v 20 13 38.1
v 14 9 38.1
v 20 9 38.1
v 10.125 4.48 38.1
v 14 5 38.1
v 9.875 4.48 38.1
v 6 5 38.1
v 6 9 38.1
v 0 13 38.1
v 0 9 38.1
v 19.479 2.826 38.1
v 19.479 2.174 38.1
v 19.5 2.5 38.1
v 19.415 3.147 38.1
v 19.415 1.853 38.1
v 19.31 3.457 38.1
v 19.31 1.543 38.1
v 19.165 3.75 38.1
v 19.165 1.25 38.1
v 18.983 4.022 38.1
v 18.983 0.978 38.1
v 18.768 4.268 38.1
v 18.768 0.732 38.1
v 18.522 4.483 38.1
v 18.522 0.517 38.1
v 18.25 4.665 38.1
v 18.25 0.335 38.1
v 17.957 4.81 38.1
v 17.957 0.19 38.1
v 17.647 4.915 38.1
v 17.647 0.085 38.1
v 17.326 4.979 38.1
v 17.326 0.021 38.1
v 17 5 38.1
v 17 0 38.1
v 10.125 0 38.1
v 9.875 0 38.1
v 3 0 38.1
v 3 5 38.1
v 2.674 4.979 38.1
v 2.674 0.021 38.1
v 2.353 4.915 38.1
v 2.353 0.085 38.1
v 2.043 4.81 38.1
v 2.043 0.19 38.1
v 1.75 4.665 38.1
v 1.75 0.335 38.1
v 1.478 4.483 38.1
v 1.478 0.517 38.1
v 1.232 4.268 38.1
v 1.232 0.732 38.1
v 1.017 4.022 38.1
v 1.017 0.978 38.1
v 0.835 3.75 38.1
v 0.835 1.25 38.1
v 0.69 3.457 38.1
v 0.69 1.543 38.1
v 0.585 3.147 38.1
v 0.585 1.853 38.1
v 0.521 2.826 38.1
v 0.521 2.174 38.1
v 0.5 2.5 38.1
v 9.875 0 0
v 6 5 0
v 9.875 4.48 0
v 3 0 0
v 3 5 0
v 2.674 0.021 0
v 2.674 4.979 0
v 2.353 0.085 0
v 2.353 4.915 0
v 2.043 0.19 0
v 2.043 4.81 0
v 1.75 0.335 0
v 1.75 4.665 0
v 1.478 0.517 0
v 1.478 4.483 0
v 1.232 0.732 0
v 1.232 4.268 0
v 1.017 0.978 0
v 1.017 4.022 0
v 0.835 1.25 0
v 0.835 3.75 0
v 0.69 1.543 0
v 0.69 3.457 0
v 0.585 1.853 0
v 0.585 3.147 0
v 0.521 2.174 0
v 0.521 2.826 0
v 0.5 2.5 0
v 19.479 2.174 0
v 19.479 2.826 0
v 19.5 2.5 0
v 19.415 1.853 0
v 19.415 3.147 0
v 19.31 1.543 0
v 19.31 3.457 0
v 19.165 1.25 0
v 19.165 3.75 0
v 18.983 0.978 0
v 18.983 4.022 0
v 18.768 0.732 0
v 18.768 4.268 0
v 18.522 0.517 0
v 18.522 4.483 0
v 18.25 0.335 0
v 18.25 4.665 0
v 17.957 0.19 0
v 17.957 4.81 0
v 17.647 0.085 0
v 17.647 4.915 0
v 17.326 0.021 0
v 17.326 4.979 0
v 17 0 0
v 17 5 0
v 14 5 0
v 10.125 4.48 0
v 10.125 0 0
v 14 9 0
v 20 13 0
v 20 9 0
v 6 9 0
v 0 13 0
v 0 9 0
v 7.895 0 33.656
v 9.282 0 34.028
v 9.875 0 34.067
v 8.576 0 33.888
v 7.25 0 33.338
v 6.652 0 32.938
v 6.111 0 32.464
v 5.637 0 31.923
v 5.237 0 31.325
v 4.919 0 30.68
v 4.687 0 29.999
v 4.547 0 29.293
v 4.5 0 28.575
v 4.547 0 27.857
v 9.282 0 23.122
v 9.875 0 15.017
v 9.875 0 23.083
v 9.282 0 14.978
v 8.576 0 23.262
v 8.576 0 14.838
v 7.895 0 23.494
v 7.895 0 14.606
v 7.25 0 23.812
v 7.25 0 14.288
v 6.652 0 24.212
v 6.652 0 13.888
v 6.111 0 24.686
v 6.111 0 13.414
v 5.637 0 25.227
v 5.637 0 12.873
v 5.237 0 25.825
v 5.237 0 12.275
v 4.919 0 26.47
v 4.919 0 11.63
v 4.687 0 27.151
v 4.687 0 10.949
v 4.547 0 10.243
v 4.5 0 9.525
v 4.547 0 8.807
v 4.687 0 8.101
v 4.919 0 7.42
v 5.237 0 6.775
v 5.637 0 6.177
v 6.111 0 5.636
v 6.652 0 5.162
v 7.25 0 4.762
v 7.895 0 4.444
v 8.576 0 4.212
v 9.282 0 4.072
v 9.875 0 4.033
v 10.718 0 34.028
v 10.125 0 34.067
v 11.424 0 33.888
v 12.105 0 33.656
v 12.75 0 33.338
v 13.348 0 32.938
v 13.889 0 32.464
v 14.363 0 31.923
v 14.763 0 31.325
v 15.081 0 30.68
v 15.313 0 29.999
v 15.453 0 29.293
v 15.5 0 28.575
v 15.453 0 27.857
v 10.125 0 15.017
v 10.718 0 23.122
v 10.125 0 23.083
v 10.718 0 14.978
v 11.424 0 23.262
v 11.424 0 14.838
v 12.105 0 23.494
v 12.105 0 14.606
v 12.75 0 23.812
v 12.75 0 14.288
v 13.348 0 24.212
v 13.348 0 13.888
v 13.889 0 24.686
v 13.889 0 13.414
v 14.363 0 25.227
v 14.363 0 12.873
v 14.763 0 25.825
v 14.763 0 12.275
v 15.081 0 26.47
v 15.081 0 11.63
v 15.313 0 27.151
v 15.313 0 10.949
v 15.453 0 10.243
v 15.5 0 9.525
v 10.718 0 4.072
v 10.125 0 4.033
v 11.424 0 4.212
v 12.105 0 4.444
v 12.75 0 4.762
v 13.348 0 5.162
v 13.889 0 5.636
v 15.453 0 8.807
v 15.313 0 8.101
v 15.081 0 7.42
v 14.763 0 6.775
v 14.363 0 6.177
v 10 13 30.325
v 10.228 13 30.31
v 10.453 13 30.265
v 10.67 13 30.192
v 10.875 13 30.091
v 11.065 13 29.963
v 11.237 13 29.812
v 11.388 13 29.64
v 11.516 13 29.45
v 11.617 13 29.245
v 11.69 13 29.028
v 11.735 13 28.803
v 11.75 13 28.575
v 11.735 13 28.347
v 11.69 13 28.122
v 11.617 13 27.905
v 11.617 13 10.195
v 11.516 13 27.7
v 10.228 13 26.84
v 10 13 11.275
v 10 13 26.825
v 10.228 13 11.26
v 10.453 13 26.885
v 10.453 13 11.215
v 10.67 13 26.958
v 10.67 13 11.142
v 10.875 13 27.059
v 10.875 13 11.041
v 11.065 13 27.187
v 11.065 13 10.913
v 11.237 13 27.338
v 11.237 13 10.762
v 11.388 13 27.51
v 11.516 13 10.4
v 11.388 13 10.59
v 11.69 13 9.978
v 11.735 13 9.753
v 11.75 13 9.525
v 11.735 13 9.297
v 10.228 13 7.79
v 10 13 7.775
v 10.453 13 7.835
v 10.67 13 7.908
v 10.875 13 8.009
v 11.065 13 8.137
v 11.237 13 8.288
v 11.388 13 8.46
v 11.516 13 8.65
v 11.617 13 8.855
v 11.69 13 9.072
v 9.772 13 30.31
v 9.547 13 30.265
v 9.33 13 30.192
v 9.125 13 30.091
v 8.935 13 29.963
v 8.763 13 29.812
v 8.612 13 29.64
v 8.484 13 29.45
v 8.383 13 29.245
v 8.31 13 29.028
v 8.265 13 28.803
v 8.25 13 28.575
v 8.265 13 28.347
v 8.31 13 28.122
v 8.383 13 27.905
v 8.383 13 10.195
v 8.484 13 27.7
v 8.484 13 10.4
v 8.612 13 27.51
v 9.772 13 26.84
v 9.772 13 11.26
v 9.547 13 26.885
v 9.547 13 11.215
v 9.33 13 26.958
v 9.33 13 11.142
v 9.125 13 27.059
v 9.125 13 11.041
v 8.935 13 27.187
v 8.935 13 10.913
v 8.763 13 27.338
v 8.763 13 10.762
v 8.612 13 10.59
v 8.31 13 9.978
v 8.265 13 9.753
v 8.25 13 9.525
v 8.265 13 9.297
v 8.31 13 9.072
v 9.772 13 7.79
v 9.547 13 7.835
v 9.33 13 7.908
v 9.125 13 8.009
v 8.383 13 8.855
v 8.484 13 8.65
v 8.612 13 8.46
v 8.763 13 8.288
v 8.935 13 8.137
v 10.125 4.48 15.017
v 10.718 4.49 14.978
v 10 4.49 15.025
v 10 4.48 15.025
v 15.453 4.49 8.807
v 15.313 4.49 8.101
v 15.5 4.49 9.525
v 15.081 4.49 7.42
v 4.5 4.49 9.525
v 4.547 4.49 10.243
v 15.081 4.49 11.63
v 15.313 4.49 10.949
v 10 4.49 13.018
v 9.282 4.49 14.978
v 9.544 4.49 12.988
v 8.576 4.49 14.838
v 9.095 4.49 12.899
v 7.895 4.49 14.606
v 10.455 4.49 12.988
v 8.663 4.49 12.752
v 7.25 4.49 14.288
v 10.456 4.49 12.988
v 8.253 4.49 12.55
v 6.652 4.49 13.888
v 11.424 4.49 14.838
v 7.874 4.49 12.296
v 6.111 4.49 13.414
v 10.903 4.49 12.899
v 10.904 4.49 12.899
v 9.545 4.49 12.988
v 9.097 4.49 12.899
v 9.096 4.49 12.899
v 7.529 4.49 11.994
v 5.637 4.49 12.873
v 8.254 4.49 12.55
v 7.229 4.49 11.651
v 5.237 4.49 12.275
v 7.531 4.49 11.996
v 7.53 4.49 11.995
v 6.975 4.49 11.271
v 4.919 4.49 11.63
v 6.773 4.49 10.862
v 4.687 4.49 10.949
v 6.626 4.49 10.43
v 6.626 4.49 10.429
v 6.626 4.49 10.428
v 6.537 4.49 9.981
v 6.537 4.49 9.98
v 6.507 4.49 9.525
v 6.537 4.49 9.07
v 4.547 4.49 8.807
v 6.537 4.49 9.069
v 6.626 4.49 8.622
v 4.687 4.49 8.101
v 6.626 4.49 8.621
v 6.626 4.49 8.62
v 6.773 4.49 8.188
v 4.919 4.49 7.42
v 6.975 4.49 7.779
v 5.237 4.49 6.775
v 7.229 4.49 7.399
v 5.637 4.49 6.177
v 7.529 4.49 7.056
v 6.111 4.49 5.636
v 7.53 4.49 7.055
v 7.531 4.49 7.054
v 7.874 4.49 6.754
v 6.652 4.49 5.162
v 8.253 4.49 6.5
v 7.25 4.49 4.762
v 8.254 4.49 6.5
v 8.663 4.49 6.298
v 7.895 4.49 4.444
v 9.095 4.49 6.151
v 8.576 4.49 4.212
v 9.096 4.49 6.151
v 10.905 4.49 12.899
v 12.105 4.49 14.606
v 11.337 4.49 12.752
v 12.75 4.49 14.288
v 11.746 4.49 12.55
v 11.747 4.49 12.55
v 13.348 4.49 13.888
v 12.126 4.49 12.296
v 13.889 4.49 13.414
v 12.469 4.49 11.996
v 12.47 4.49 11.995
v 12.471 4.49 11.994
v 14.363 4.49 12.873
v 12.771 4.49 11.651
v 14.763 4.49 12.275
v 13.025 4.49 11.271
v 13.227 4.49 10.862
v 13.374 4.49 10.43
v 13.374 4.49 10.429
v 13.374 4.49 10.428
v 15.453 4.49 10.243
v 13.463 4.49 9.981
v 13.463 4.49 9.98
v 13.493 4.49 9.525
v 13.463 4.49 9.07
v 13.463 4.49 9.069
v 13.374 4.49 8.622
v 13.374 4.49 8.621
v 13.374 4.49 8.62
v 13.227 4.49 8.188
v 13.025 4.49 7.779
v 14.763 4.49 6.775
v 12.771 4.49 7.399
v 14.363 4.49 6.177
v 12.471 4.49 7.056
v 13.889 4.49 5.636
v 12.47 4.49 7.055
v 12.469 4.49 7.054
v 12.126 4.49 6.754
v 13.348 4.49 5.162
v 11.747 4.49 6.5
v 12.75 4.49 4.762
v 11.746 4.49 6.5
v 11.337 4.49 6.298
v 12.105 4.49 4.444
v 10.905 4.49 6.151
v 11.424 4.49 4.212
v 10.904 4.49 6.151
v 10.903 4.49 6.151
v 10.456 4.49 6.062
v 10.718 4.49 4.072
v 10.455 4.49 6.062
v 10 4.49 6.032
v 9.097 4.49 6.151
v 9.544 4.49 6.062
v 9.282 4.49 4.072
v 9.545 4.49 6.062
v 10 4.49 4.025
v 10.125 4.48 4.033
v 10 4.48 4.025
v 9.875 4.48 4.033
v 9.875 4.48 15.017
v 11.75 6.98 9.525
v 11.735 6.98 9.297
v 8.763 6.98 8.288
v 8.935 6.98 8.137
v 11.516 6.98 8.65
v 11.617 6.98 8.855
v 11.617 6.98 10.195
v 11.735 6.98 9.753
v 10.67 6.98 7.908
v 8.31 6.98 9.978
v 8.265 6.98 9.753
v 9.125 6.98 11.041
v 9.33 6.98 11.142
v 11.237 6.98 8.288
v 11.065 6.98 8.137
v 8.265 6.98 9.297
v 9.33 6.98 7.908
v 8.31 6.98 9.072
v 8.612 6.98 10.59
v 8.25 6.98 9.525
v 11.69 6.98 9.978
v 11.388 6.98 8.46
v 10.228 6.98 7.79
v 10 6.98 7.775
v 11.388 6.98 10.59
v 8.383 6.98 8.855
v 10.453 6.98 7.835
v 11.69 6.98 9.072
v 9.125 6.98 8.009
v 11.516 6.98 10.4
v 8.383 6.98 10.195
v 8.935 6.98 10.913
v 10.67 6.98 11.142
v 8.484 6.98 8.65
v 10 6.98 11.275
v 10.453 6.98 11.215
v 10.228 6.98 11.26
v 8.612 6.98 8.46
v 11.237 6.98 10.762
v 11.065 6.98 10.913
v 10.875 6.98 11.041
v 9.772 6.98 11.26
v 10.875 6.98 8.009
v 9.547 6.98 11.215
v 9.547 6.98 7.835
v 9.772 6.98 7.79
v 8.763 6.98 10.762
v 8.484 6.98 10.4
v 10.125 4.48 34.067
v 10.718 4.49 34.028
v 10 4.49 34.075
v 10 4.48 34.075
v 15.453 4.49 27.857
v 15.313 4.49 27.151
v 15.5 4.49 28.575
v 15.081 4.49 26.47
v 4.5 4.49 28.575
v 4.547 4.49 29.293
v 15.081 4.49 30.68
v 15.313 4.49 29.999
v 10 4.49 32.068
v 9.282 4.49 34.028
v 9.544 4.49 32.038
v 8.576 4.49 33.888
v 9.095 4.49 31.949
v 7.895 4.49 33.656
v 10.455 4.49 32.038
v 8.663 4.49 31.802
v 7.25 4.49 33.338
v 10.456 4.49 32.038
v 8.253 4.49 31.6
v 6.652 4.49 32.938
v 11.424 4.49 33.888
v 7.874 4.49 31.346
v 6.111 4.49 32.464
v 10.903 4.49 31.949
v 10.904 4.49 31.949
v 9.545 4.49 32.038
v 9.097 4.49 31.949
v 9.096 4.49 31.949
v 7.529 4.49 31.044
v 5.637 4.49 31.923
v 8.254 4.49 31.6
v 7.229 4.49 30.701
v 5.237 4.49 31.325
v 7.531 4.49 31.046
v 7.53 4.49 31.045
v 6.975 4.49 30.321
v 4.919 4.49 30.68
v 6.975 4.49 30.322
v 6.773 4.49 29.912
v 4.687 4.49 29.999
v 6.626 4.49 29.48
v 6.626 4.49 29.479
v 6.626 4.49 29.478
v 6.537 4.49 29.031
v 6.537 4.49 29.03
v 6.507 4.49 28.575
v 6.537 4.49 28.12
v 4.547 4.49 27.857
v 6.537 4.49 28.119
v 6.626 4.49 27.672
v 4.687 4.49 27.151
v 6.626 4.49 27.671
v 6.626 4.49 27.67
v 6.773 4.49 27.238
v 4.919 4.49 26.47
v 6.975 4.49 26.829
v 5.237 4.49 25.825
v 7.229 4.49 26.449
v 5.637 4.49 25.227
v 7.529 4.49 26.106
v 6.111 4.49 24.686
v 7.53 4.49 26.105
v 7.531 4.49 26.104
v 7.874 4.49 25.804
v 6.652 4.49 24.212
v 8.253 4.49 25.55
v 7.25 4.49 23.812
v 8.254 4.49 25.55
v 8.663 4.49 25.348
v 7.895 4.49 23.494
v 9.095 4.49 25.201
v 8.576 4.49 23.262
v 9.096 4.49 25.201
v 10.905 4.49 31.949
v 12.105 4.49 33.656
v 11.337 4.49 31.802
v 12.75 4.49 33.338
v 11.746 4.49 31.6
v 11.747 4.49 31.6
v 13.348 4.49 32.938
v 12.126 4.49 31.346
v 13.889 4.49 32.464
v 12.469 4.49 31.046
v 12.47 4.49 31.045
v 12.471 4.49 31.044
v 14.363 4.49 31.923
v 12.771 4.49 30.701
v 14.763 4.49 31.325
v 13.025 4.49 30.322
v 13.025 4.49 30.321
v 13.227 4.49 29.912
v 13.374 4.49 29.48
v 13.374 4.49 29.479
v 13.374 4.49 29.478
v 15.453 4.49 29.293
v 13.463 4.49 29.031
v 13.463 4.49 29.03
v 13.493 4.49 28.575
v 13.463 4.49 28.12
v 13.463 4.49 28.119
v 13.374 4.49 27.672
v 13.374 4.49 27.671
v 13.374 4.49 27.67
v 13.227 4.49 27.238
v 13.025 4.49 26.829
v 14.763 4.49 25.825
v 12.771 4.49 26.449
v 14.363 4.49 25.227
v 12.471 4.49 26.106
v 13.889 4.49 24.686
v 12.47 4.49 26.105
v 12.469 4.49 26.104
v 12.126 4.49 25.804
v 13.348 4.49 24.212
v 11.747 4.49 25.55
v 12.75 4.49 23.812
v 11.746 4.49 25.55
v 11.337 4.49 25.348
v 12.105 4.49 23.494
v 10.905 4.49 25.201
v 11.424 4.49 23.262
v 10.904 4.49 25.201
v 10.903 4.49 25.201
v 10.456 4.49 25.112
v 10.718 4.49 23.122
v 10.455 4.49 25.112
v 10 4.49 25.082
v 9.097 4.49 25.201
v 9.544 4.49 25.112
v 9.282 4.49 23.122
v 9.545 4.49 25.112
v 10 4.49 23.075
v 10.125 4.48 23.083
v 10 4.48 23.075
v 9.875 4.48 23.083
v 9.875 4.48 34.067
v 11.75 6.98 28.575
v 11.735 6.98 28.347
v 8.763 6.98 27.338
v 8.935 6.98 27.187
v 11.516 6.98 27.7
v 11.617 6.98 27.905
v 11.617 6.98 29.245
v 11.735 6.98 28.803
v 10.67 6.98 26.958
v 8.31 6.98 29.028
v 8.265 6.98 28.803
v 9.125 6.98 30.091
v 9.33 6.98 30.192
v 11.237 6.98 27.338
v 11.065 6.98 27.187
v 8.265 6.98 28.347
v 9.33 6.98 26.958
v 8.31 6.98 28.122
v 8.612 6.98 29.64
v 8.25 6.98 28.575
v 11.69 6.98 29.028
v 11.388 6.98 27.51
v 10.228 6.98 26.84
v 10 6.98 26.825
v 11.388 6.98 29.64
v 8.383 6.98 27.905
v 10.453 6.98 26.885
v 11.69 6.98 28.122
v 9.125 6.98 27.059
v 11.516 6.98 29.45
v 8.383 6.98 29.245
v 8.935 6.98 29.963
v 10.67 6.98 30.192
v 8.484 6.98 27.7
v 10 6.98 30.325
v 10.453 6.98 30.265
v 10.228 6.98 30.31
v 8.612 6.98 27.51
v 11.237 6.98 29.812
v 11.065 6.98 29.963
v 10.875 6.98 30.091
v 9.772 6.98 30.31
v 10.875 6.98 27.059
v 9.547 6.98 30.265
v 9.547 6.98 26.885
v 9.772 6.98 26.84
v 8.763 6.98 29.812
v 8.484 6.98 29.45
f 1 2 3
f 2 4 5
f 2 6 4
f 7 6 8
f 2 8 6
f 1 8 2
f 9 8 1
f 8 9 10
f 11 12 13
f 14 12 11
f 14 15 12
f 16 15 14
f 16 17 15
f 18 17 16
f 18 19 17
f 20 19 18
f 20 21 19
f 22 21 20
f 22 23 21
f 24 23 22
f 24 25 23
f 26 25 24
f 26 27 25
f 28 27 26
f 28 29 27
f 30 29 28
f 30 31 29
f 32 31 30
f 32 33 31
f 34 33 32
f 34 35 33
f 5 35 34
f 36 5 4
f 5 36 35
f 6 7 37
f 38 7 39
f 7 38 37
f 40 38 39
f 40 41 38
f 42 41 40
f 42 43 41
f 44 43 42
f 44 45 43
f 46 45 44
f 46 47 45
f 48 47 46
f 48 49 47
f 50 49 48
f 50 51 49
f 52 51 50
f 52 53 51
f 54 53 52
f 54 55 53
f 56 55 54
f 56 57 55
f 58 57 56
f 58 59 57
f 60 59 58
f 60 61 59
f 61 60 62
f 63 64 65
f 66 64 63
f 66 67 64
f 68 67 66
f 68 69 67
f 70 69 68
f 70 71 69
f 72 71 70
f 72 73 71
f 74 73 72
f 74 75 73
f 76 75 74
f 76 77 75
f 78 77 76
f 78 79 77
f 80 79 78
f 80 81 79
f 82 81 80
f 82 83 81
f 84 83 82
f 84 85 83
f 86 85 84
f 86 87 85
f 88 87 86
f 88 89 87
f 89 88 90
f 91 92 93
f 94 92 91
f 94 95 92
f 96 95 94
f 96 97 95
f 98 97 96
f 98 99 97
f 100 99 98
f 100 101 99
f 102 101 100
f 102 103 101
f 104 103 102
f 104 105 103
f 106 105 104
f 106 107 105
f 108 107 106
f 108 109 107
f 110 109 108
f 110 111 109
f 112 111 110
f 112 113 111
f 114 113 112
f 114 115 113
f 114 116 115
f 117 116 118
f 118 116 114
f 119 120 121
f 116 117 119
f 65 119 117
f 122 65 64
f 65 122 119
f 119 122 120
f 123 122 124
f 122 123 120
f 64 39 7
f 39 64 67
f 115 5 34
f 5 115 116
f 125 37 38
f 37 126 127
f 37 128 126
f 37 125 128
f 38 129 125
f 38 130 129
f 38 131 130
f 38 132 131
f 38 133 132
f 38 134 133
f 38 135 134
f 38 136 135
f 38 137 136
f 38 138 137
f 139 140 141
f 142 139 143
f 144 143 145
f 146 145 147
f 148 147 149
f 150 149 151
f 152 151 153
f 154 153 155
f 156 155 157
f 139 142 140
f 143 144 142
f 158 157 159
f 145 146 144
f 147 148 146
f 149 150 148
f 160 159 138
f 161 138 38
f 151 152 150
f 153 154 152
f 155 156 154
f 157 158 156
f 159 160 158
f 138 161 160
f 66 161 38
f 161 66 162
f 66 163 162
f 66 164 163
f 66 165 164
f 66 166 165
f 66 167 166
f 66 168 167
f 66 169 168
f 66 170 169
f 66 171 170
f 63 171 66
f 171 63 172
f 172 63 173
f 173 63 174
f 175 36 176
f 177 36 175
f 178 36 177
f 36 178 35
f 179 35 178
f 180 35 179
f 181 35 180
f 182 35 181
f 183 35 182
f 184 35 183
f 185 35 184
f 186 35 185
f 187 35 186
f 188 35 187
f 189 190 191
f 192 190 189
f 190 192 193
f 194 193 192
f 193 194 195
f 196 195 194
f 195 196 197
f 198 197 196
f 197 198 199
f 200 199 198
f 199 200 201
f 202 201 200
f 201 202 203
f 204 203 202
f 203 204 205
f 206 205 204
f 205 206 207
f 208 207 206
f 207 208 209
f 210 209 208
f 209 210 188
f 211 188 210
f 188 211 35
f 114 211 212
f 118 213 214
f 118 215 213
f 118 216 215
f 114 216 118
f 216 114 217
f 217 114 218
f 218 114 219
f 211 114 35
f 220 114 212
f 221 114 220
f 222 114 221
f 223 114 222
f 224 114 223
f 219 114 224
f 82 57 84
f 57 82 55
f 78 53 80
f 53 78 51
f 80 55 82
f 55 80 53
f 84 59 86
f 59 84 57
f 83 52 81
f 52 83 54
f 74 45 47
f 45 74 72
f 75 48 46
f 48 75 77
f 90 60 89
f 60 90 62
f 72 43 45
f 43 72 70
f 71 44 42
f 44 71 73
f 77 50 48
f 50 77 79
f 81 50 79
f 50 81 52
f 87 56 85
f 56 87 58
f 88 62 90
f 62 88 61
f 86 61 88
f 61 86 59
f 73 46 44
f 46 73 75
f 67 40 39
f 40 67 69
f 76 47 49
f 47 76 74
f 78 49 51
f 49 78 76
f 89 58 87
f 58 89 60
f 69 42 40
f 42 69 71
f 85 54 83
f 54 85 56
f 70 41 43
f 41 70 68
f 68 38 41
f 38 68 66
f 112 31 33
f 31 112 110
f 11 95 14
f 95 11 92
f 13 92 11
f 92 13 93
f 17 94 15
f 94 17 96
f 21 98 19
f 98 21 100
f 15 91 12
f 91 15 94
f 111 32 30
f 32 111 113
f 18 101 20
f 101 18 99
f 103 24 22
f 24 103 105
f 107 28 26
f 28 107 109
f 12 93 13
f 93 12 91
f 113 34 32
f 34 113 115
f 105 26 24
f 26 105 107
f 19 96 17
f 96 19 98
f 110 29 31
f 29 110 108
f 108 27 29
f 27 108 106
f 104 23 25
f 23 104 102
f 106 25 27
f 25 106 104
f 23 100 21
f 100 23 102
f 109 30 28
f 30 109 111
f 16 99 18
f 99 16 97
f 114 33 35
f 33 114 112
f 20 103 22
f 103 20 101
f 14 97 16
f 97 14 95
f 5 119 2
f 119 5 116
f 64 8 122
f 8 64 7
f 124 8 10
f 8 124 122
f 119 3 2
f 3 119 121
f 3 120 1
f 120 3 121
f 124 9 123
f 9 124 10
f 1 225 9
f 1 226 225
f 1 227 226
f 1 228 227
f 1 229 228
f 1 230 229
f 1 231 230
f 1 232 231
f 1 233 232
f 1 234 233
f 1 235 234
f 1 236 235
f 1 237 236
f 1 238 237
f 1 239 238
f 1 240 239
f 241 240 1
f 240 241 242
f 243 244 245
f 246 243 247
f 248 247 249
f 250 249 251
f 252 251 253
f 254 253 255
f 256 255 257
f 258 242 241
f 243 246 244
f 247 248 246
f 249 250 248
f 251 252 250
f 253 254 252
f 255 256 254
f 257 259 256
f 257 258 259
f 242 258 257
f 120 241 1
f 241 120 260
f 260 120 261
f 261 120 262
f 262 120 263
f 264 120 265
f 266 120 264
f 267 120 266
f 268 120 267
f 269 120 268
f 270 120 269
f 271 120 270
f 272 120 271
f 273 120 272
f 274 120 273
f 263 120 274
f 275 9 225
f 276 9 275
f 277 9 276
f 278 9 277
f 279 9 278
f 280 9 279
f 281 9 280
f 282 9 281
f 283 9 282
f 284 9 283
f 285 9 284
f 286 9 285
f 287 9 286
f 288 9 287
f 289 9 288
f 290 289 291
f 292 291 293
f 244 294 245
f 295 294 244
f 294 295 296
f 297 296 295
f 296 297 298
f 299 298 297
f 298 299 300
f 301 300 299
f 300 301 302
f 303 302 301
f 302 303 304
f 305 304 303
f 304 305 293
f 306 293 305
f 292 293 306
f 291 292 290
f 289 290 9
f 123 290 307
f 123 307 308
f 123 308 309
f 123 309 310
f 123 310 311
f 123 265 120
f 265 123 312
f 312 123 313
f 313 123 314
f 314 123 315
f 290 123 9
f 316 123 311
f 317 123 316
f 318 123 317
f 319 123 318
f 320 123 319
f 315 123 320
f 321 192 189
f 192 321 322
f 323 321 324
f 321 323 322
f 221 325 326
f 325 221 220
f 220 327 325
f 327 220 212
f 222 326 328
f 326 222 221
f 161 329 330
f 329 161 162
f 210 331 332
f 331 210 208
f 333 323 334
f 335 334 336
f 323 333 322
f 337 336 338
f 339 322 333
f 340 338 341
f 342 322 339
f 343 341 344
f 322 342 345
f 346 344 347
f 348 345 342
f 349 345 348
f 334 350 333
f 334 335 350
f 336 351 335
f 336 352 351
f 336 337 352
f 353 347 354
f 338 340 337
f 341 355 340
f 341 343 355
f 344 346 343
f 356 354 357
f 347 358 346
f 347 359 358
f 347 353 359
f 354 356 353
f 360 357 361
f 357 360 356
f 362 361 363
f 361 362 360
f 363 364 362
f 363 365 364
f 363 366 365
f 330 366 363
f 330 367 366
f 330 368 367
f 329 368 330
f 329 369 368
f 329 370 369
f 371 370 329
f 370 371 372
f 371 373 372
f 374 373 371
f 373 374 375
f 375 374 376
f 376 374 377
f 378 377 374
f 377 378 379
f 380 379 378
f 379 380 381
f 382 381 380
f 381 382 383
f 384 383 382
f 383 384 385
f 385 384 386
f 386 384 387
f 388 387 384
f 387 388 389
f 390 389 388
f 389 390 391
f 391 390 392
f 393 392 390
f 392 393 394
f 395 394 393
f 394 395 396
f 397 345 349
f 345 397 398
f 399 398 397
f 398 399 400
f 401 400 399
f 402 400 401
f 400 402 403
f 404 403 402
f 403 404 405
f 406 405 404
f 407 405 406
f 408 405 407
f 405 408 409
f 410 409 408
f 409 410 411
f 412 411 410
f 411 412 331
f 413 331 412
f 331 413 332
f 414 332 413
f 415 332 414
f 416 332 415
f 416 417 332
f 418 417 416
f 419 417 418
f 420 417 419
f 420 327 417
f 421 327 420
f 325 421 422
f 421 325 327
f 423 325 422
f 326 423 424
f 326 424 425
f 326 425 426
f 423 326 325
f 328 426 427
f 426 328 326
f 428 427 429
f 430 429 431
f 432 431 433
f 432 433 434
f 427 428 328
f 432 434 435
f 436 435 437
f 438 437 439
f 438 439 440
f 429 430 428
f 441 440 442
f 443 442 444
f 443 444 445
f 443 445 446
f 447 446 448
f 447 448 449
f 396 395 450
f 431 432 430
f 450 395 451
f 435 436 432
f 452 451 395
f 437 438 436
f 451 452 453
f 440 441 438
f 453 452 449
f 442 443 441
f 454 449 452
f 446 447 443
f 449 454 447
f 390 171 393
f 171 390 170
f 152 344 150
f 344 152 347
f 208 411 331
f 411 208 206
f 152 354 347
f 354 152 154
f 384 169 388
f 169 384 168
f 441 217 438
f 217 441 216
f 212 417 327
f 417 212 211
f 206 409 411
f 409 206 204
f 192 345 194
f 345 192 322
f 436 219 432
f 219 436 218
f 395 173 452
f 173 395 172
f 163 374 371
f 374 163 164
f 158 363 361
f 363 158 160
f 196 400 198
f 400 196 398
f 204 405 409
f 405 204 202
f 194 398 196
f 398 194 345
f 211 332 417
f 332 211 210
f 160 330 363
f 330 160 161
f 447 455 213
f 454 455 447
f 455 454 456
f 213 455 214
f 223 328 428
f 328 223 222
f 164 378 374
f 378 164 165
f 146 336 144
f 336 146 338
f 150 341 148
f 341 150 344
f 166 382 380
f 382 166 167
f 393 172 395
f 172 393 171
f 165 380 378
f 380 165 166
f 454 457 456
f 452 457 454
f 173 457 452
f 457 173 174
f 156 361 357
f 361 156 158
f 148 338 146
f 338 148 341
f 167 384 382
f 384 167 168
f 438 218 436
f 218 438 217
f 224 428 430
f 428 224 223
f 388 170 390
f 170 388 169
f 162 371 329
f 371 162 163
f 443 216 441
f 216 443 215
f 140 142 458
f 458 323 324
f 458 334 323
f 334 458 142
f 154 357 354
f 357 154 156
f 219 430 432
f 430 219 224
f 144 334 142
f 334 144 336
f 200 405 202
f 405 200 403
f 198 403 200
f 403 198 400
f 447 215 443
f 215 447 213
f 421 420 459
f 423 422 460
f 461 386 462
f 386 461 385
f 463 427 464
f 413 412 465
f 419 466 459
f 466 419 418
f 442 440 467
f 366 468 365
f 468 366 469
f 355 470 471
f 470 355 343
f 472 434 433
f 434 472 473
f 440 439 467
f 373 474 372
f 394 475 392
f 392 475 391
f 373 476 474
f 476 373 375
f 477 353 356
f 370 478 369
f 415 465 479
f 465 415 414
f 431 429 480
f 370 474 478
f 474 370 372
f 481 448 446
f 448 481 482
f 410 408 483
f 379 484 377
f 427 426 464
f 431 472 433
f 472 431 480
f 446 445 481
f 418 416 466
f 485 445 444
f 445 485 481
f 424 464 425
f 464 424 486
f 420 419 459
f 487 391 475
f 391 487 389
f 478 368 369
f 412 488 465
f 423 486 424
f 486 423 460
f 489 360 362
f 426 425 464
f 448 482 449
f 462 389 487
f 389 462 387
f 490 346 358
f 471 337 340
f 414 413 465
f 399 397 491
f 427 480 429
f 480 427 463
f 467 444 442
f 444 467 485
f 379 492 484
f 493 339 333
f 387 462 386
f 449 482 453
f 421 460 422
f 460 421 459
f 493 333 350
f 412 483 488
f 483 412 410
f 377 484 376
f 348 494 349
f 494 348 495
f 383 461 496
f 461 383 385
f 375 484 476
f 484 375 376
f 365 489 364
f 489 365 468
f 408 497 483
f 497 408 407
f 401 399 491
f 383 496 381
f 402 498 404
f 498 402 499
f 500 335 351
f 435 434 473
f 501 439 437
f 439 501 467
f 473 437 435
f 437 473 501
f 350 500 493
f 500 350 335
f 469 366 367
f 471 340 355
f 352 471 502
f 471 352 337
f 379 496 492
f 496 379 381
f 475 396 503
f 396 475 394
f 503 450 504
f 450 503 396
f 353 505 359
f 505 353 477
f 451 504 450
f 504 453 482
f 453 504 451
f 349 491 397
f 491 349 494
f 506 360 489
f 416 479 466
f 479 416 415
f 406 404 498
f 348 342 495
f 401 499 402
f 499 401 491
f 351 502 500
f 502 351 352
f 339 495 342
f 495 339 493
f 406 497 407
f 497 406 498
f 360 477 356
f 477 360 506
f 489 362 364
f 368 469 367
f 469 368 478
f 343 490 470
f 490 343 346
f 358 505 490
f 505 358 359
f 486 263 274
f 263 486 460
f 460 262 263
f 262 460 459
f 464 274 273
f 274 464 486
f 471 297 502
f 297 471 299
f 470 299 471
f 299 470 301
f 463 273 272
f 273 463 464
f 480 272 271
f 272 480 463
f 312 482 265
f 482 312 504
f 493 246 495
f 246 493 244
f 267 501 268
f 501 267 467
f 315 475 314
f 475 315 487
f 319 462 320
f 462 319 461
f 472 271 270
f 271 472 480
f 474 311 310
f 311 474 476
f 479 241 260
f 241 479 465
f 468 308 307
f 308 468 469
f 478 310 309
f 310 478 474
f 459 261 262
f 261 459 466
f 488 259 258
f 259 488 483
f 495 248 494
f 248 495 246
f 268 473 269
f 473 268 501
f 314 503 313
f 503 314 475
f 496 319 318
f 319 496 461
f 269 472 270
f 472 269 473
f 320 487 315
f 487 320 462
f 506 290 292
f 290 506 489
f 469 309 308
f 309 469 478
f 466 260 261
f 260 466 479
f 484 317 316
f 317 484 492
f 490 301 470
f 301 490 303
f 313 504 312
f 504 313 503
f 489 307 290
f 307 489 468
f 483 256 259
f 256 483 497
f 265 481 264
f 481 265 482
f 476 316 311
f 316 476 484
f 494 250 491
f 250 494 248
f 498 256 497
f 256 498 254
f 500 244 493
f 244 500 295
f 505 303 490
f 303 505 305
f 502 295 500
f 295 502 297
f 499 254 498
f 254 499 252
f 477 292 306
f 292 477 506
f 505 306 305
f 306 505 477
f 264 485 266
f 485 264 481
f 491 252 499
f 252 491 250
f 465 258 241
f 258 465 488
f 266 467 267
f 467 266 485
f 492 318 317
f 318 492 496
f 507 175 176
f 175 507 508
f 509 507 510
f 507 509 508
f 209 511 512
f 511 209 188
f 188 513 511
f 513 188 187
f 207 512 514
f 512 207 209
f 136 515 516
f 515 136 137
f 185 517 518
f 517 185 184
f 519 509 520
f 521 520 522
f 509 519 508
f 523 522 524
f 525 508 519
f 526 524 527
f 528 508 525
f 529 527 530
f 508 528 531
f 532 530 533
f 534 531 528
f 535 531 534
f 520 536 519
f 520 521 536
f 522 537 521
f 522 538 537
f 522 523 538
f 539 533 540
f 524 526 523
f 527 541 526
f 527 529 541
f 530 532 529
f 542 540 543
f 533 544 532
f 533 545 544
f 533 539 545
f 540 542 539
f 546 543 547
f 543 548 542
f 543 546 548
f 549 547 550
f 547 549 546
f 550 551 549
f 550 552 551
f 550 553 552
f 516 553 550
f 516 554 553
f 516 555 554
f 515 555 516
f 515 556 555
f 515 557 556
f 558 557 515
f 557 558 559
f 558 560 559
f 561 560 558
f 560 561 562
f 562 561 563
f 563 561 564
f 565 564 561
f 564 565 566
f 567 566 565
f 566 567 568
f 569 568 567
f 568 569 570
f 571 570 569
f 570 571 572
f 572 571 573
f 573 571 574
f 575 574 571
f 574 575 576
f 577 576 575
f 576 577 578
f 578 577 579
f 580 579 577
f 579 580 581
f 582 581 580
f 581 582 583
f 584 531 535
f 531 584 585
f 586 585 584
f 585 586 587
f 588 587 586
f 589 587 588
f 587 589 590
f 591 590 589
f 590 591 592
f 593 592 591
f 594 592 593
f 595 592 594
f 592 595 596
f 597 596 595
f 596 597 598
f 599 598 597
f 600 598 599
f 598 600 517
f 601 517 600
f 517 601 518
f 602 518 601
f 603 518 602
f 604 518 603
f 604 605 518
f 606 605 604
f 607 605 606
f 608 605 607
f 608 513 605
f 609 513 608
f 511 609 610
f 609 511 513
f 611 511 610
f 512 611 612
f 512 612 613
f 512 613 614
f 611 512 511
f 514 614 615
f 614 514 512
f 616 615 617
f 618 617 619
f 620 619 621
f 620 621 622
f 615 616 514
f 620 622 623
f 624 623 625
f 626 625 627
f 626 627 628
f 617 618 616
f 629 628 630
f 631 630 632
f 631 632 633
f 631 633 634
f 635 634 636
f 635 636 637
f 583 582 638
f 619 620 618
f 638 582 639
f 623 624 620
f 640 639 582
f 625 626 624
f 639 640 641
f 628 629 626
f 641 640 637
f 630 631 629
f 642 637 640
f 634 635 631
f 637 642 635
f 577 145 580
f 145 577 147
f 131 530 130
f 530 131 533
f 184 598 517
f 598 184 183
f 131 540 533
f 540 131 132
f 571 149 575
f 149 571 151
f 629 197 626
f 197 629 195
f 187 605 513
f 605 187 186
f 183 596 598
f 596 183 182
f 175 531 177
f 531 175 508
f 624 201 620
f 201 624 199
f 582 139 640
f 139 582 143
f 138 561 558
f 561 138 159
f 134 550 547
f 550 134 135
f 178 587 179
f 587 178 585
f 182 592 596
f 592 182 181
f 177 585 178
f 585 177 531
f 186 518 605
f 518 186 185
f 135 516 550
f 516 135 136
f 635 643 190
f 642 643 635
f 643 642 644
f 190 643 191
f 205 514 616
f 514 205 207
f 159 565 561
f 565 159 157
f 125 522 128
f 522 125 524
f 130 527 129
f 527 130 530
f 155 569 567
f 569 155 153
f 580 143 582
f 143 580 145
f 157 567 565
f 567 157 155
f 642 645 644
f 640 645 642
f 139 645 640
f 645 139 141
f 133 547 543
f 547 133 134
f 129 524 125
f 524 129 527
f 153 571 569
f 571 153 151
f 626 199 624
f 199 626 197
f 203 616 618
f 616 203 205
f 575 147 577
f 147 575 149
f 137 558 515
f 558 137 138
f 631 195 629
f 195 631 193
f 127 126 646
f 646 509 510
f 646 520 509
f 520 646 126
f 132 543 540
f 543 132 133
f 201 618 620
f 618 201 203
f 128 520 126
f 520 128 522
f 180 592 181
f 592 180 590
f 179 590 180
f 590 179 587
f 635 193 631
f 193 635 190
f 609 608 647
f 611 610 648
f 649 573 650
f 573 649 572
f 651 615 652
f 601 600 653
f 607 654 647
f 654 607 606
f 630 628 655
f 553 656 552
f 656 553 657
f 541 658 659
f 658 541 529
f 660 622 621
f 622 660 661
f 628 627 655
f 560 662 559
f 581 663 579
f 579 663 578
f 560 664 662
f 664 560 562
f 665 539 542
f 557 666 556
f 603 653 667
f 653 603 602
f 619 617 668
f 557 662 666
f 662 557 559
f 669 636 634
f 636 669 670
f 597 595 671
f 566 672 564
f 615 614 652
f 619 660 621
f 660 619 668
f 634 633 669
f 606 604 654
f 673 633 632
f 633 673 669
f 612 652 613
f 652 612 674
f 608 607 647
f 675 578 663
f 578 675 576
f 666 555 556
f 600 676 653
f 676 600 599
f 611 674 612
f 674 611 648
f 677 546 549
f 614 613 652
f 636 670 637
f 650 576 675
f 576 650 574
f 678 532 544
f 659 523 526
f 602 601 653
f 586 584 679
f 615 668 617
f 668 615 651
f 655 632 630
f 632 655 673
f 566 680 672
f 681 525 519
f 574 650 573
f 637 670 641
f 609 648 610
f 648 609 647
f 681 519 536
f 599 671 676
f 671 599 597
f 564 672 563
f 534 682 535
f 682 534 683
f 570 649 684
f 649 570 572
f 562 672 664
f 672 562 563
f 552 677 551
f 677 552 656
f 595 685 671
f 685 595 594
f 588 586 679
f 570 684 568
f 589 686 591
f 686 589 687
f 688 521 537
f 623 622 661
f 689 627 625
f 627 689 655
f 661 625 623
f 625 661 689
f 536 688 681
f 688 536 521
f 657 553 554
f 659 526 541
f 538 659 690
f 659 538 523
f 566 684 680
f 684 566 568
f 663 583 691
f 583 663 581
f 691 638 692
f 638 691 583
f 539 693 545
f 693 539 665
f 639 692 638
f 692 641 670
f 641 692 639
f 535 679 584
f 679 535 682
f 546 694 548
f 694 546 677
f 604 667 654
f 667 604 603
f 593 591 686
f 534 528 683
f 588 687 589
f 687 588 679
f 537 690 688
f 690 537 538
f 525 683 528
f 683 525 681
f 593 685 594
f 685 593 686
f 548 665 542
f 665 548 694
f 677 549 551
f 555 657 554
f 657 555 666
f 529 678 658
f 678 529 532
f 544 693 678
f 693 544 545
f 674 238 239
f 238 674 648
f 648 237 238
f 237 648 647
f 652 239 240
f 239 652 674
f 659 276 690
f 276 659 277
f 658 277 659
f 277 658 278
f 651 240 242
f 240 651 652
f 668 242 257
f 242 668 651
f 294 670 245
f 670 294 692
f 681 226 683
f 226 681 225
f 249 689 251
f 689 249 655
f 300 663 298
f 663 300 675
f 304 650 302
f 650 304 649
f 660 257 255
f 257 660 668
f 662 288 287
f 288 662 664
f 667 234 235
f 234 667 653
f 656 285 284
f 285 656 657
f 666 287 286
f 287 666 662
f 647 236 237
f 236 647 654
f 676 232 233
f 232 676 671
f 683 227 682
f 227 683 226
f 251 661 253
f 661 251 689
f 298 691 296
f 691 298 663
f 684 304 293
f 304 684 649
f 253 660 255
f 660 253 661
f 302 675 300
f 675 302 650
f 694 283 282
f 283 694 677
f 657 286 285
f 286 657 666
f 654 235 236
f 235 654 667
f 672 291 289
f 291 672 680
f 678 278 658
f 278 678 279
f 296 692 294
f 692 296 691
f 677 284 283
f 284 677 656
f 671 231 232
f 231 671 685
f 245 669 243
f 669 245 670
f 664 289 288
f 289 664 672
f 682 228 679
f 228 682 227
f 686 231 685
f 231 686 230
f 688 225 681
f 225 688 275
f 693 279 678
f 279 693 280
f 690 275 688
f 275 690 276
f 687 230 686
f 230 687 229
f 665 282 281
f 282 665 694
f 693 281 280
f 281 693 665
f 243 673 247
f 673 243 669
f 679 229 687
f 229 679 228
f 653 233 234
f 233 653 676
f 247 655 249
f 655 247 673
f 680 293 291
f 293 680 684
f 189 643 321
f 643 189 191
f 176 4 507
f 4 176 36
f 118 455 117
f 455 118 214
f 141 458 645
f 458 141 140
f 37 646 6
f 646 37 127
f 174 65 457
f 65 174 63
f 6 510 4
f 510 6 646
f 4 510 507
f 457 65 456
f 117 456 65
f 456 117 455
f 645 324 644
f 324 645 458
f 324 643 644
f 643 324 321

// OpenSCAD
// file: parts.scad
$fn=48;
width = 20; // width of wall backer
rdiff = 3;
rwidth = width-rdiff*2;
rdepth = 5;
cdiff = 6;
cwidth = width-cdiff*2;
cdepth = 4;
height = 1.5 * 25.4; // 1.5 inches


module rail() {
    // Make the main rail segment
    translate([rdiff,0,0])
        cube([rwidth, rdepth, height]);
    translate([rdiff,rdepth/2,0])
        cylinder(r=rdepth/2,height);
    translate([width-rdiff,rdepth/2,0])
        cylinder(r=rdepth/2,height);
    // Make the connection between the rail and the wall backer
    translate([cdiff, rdepth, 0])
        cube([cwidth, cdepth, height]);
    // Make the wall backer
    translate([0,rdepth+cdepth,0])
        cube([width, cdepth, height]);
}
// main file
// The idea is to make an installable rail that the display shelf will slide onto.

include <parts.scad>

module screw_hole() {
    cylinder(r = 5.5, h = 4.5);
    translate([0,0,4.5-0.01])
        cylinder(r1=3.5,r2=1.75,h=2.5);
    cylinder(r=1.75, h=30);

}


difference() {
    rail();
    translate([width/2,-0.01,0]) {
        translate([0,0,height/4]) rotate([-90,0,0]) screw_hole();
        translate([0,0,height*3/4]) rotate([-90,0,0]) screw_hole();
        translate([-0.125,-0.01,-0.01])
            cube([0.25,4.5,height+2]);
    }
}
